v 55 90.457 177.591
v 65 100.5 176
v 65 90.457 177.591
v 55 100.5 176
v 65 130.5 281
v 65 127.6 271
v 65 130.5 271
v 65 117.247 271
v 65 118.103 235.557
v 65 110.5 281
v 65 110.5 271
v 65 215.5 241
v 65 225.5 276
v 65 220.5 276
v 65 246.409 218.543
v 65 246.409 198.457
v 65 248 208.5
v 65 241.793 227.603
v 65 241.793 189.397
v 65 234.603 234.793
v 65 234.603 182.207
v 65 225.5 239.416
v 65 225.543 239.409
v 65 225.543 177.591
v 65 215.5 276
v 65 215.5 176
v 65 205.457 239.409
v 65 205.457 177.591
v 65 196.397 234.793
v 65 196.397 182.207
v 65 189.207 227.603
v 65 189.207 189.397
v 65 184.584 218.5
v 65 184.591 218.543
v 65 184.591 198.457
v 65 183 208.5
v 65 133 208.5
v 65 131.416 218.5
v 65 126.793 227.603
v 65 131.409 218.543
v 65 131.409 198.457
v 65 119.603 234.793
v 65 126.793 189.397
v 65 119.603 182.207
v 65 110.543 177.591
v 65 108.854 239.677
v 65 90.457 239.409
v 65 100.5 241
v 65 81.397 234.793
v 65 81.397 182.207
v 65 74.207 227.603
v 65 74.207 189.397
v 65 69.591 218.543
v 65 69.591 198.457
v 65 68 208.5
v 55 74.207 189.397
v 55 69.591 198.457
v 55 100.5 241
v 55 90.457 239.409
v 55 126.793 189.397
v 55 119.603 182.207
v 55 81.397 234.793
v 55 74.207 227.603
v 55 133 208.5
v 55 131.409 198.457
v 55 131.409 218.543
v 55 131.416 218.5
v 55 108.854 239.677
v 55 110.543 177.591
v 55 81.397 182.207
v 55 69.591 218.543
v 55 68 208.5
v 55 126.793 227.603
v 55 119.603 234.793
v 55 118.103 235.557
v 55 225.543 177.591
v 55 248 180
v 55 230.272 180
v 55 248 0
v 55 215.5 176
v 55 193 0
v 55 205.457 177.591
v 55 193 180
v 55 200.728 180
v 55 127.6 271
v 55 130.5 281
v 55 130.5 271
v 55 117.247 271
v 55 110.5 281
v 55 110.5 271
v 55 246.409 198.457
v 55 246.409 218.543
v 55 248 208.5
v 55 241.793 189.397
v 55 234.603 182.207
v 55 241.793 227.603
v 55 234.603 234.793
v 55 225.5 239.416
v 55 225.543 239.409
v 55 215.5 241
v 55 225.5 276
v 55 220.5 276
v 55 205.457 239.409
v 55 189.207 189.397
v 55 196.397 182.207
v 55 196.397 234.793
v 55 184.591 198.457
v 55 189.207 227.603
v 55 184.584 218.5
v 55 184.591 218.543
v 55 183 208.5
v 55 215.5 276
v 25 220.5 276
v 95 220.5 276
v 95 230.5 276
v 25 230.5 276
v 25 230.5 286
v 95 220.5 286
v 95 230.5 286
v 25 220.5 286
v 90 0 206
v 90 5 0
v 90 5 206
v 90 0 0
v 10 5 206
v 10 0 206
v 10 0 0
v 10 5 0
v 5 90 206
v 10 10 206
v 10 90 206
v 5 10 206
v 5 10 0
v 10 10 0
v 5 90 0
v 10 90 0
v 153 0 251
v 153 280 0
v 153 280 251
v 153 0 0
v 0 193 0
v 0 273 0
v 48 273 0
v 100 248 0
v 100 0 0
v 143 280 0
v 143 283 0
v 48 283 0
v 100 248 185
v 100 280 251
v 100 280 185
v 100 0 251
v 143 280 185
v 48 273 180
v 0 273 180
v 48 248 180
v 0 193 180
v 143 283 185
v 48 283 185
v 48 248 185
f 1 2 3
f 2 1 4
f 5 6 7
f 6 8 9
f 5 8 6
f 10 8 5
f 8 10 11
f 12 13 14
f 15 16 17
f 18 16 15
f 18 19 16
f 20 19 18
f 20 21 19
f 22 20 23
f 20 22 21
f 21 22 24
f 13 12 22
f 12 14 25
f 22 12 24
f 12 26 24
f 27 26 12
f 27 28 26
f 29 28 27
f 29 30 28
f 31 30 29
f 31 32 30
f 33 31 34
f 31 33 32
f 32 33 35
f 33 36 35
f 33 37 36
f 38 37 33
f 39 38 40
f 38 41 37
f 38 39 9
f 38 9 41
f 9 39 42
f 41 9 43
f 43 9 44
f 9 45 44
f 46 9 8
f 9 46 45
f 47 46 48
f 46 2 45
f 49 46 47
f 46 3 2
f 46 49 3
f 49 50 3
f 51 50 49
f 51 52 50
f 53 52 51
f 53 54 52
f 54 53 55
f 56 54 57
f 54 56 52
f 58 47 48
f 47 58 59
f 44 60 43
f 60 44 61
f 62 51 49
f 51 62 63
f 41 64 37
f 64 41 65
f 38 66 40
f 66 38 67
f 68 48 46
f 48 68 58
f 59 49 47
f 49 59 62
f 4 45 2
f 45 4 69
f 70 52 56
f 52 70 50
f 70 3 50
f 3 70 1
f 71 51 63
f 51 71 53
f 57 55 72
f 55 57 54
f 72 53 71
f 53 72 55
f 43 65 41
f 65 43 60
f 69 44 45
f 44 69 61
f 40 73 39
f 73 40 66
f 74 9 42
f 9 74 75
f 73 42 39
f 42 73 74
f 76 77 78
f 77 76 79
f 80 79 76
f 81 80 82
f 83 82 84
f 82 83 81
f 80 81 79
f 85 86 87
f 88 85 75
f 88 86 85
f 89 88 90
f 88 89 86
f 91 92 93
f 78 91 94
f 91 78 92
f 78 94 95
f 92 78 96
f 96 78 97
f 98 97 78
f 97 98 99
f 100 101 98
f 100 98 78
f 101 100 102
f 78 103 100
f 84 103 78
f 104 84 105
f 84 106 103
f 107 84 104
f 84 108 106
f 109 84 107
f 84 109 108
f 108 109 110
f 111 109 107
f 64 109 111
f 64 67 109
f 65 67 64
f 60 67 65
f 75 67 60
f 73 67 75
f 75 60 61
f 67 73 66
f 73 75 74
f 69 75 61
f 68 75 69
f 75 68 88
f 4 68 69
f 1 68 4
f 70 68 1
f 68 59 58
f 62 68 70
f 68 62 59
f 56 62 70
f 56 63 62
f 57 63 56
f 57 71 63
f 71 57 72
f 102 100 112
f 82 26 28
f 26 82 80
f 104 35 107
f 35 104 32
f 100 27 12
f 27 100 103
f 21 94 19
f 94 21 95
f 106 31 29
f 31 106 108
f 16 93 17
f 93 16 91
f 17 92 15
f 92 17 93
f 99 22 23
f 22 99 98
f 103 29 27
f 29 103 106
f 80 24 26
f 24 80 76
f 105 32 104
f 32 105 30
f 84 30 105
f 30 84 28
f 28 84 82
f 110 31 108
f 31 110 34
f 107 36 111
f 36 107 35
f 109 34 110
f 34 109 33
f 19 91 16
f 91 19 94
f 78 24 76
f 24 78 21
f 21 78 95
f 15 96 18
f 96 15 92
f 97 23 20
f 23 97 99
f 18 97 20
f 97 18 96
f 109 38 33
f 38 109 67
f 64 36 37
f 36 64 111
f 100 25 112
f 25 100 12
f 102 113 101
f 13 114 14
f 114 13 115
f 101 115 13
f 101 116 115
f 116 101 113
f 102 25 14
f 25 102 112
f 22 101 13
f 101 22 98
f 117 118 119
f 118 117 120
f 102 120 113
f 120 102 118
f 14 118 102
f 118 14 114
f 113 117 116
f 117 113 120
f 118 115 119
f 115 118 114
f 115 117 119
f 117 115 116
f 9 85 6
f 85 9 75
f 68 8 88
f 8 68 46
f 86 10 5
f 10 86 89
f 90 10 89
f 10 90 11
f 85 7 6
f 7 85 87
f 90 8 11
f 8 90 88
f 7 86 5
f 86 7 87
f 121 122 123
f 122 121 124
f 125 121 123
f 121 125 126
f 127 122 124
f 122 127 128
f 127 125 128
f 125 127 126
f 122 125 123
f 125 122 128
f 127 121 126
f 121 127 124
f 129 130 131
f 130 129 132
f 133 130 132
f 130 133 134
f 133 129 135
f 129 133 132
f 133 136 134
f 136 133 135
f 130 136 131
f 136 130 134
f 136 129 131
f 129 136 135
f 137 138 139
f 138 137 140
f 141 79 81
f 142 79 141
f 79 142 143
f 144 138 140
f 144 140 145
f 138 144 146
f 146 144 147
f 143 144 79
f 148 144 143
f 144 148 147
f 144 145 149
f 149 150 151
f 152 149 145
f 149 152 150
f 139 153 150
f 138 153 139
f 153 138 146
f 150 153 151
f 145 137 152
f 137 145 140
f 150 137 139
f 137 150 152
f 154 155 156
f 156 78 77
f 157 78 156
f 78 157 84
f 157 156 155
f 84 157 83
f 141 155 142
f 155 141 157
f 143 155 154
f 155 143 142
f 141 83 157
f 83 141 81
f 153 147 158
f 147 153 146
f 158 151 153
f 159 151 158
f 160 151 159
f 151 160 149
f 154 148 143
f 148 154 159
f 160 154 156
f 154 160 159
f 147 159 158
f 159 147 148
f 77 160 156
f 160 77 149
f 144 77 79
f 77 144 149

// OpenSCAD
// Proyecto trastero - bicicleta y sillas
// medidas en cm
// 2016.08.05 PPF

// PARAMETRIZACION DE DIMENSIONES
delta=10; // margen colchoncillo
//espacio continente
pared_x =153;
pared_y=283;
altura_z=286;
// puerta entrada
puerta_ancho = 80;
puerta_alto = 206;
puerta_grosor = 5; //hipótesis
// estantes
estante_ancho = 53;
estante_alto=251; // parcialmente libre
estante_alto_minimo=208; // hasta ultima balda
estante_alto_diferencia=43; // diferencia alto
estante_largo=280; //hipótesis
// armario ropero
armario_fondo=55;
armario_largo=80;
armario_alto=180;
// colchón cama de 90
colchon_alto=185;
colchon_ancho=95;
colchon_grosor=25;
// bici
bici_largo=180;
bici_ancho=70;
bici_alto=100;

// DEFINICIÓN MÓDULO BICI HIGH-FIDELITY
module bici_HF(largo=bici_largo, ancho=bici_ancho, alto=bici_alto, diametro =65){
    //dar volumen a las barras
    grosor=10;
    //posicionar en origen
    posx=50;
    posy=diametro/2;
    posz=diametro/2;
    
    //renderizar rueda atras
    translate ([-50+posx,0+posy,0+posz])
    rotate ([0,90,0])
    linear_extrude(10)
    circle (d=diametro, center=true,$fn=20);
    //renderizar rueda delante
    translate ([-50+posx,largo-diametro+posy,0+posz])
    rotate ([0,90,0])
    linear_extrude(10)
    circle (d=diametro, center=true,$fn=20);
    //renderizar bastidor horizontal
    color("red")
    translate ([-50+posx, 0+posy,0+posz])
    cube([grosor, largo-diametro, grosor]);
    //renderizar bastidor vertical
    color("red")
    translate ([-50+posx, largo-diametro+posy,0+posz])
    cube([grosor, grosor, alto-diametro/2]);
    //renderizar manillar
    color("red")
    translate ([-50+posx+ancho/2+grosor/2, largo-diametro+grosor/2+posy,alto-diametro/2+posz])
    rotate([0,0,90])
    cube([grosor, ancho, grosor]);
    //renderizar bastidor sillín
    color("red")
    translate ([-50+posx, 0+posy,0+posz])
    rotate([-15,0,0])
    cube([grosor, grosor, alto-diametro/2]);
    //renderizar sillín
    color("red")
    translate ([-50+posx+grosor, grosor+posy,alto-diametro/2-grosor/2+posz])
    rotate([0,0,90])
    cube([2*grosor, grosor, grosor]);

  //regla comprobación dimensiones
 /*  color("green") // largo
     translate ([-50-diametro/2+posx, -diametro/2+posy,0+posz])
     cube([10, largo, 10]);

     color("green") // alto
     translate ([-50-diametro/2+posx, -diametro/2+posy,-diametro/2+posz])
     cube([10, 10, alto]);
*/
}


// RENDERIZACION DE BLOQUES
// ESPACIO CONTINENTE
%cube ([pared_x,pared_y, altura_z]); 
// PUERTA CERRADA
translate ([10,0,0])
cube ([puerta_ancho, puerta_grosor,puerta_alto]);
// PUERTA ABERTA
rotate (90,0,0)
translate ([10,-10,0])
cube ([puerta_ancho, puerta_grosor,puerta_alto]);
// ESTANTE
translate ([100,0,0])
cube ([estante_ancho, estante_largo,estante_alto_minimo]);
// ESTANTE espacio superior    
color("red")
translate ([100,0,estante_alto_minimo])
cube ([estante_ancho, estante_largo,estante_alto_diferencia]);
// ARMARIO
translate ([0,pared_y-armario_largo-delta,0]) // ajustando
cube ([armario_fondo,armario_largo,armario_alto]);
// COLCHÓN
translate ([pared_x-colchon_ancho-delta,pared_y-colchon_grosor-delta,0])
cube ([colchon_ancho,colchon_grosor+delta,colchon_alto]);

//bici HIGH fidelity
// posicion de referencia = posicion de almacenado
EjeX=bici_ancho-delta*3/2;
EjeY=pared_y-bici_largo-colchon_grosor-delta;
EjeZ=altura_z-bici_alto-delta;

color("blue")
translate ([EjeX,EjeY,EjeZ]) // posicion almacenado
//translate ([EjeX,EjeY-6*delta,EjeZ]) //posicion subida y bajada
//translate ([EjeX,EjeY-6*delta,0])//posicion en suelo
//cube ([bici_ancho,bici_largo,bici_alto]); // bici LOW FIDELITY
bici_HF(); // bici HIGH FIDELITY


//REGLA COMPROBACION GIRO PUERTA
/*color("green")
   cylinder(h=puerta_alto+delta/2, r=puerta_ancho+10);
*/
//REGLA COMPROBACION PERSONA
/* color("green")
translate ([30,0,0])
cube([60, 200, 175]);
*/

// VISTA SIMULTÁNEA 3 POSICIONES
/*color("blue")
translate ([EjeX,EjeY,EjeZ]) // posicion almacenado
bici_HF(); // bici HIGH FIDELITY

color("green")
translate ([EjeX,EjeY-6*delta,EjeZ]) //posicion subida y bajada
bici_HF(); // bici HIGH FIDELITY

color("red")
translate ([EjeX,EjeY-6*delta,0])//posicion en suelo
bici_HF(); // bici HIGH FIDELITY
*/
